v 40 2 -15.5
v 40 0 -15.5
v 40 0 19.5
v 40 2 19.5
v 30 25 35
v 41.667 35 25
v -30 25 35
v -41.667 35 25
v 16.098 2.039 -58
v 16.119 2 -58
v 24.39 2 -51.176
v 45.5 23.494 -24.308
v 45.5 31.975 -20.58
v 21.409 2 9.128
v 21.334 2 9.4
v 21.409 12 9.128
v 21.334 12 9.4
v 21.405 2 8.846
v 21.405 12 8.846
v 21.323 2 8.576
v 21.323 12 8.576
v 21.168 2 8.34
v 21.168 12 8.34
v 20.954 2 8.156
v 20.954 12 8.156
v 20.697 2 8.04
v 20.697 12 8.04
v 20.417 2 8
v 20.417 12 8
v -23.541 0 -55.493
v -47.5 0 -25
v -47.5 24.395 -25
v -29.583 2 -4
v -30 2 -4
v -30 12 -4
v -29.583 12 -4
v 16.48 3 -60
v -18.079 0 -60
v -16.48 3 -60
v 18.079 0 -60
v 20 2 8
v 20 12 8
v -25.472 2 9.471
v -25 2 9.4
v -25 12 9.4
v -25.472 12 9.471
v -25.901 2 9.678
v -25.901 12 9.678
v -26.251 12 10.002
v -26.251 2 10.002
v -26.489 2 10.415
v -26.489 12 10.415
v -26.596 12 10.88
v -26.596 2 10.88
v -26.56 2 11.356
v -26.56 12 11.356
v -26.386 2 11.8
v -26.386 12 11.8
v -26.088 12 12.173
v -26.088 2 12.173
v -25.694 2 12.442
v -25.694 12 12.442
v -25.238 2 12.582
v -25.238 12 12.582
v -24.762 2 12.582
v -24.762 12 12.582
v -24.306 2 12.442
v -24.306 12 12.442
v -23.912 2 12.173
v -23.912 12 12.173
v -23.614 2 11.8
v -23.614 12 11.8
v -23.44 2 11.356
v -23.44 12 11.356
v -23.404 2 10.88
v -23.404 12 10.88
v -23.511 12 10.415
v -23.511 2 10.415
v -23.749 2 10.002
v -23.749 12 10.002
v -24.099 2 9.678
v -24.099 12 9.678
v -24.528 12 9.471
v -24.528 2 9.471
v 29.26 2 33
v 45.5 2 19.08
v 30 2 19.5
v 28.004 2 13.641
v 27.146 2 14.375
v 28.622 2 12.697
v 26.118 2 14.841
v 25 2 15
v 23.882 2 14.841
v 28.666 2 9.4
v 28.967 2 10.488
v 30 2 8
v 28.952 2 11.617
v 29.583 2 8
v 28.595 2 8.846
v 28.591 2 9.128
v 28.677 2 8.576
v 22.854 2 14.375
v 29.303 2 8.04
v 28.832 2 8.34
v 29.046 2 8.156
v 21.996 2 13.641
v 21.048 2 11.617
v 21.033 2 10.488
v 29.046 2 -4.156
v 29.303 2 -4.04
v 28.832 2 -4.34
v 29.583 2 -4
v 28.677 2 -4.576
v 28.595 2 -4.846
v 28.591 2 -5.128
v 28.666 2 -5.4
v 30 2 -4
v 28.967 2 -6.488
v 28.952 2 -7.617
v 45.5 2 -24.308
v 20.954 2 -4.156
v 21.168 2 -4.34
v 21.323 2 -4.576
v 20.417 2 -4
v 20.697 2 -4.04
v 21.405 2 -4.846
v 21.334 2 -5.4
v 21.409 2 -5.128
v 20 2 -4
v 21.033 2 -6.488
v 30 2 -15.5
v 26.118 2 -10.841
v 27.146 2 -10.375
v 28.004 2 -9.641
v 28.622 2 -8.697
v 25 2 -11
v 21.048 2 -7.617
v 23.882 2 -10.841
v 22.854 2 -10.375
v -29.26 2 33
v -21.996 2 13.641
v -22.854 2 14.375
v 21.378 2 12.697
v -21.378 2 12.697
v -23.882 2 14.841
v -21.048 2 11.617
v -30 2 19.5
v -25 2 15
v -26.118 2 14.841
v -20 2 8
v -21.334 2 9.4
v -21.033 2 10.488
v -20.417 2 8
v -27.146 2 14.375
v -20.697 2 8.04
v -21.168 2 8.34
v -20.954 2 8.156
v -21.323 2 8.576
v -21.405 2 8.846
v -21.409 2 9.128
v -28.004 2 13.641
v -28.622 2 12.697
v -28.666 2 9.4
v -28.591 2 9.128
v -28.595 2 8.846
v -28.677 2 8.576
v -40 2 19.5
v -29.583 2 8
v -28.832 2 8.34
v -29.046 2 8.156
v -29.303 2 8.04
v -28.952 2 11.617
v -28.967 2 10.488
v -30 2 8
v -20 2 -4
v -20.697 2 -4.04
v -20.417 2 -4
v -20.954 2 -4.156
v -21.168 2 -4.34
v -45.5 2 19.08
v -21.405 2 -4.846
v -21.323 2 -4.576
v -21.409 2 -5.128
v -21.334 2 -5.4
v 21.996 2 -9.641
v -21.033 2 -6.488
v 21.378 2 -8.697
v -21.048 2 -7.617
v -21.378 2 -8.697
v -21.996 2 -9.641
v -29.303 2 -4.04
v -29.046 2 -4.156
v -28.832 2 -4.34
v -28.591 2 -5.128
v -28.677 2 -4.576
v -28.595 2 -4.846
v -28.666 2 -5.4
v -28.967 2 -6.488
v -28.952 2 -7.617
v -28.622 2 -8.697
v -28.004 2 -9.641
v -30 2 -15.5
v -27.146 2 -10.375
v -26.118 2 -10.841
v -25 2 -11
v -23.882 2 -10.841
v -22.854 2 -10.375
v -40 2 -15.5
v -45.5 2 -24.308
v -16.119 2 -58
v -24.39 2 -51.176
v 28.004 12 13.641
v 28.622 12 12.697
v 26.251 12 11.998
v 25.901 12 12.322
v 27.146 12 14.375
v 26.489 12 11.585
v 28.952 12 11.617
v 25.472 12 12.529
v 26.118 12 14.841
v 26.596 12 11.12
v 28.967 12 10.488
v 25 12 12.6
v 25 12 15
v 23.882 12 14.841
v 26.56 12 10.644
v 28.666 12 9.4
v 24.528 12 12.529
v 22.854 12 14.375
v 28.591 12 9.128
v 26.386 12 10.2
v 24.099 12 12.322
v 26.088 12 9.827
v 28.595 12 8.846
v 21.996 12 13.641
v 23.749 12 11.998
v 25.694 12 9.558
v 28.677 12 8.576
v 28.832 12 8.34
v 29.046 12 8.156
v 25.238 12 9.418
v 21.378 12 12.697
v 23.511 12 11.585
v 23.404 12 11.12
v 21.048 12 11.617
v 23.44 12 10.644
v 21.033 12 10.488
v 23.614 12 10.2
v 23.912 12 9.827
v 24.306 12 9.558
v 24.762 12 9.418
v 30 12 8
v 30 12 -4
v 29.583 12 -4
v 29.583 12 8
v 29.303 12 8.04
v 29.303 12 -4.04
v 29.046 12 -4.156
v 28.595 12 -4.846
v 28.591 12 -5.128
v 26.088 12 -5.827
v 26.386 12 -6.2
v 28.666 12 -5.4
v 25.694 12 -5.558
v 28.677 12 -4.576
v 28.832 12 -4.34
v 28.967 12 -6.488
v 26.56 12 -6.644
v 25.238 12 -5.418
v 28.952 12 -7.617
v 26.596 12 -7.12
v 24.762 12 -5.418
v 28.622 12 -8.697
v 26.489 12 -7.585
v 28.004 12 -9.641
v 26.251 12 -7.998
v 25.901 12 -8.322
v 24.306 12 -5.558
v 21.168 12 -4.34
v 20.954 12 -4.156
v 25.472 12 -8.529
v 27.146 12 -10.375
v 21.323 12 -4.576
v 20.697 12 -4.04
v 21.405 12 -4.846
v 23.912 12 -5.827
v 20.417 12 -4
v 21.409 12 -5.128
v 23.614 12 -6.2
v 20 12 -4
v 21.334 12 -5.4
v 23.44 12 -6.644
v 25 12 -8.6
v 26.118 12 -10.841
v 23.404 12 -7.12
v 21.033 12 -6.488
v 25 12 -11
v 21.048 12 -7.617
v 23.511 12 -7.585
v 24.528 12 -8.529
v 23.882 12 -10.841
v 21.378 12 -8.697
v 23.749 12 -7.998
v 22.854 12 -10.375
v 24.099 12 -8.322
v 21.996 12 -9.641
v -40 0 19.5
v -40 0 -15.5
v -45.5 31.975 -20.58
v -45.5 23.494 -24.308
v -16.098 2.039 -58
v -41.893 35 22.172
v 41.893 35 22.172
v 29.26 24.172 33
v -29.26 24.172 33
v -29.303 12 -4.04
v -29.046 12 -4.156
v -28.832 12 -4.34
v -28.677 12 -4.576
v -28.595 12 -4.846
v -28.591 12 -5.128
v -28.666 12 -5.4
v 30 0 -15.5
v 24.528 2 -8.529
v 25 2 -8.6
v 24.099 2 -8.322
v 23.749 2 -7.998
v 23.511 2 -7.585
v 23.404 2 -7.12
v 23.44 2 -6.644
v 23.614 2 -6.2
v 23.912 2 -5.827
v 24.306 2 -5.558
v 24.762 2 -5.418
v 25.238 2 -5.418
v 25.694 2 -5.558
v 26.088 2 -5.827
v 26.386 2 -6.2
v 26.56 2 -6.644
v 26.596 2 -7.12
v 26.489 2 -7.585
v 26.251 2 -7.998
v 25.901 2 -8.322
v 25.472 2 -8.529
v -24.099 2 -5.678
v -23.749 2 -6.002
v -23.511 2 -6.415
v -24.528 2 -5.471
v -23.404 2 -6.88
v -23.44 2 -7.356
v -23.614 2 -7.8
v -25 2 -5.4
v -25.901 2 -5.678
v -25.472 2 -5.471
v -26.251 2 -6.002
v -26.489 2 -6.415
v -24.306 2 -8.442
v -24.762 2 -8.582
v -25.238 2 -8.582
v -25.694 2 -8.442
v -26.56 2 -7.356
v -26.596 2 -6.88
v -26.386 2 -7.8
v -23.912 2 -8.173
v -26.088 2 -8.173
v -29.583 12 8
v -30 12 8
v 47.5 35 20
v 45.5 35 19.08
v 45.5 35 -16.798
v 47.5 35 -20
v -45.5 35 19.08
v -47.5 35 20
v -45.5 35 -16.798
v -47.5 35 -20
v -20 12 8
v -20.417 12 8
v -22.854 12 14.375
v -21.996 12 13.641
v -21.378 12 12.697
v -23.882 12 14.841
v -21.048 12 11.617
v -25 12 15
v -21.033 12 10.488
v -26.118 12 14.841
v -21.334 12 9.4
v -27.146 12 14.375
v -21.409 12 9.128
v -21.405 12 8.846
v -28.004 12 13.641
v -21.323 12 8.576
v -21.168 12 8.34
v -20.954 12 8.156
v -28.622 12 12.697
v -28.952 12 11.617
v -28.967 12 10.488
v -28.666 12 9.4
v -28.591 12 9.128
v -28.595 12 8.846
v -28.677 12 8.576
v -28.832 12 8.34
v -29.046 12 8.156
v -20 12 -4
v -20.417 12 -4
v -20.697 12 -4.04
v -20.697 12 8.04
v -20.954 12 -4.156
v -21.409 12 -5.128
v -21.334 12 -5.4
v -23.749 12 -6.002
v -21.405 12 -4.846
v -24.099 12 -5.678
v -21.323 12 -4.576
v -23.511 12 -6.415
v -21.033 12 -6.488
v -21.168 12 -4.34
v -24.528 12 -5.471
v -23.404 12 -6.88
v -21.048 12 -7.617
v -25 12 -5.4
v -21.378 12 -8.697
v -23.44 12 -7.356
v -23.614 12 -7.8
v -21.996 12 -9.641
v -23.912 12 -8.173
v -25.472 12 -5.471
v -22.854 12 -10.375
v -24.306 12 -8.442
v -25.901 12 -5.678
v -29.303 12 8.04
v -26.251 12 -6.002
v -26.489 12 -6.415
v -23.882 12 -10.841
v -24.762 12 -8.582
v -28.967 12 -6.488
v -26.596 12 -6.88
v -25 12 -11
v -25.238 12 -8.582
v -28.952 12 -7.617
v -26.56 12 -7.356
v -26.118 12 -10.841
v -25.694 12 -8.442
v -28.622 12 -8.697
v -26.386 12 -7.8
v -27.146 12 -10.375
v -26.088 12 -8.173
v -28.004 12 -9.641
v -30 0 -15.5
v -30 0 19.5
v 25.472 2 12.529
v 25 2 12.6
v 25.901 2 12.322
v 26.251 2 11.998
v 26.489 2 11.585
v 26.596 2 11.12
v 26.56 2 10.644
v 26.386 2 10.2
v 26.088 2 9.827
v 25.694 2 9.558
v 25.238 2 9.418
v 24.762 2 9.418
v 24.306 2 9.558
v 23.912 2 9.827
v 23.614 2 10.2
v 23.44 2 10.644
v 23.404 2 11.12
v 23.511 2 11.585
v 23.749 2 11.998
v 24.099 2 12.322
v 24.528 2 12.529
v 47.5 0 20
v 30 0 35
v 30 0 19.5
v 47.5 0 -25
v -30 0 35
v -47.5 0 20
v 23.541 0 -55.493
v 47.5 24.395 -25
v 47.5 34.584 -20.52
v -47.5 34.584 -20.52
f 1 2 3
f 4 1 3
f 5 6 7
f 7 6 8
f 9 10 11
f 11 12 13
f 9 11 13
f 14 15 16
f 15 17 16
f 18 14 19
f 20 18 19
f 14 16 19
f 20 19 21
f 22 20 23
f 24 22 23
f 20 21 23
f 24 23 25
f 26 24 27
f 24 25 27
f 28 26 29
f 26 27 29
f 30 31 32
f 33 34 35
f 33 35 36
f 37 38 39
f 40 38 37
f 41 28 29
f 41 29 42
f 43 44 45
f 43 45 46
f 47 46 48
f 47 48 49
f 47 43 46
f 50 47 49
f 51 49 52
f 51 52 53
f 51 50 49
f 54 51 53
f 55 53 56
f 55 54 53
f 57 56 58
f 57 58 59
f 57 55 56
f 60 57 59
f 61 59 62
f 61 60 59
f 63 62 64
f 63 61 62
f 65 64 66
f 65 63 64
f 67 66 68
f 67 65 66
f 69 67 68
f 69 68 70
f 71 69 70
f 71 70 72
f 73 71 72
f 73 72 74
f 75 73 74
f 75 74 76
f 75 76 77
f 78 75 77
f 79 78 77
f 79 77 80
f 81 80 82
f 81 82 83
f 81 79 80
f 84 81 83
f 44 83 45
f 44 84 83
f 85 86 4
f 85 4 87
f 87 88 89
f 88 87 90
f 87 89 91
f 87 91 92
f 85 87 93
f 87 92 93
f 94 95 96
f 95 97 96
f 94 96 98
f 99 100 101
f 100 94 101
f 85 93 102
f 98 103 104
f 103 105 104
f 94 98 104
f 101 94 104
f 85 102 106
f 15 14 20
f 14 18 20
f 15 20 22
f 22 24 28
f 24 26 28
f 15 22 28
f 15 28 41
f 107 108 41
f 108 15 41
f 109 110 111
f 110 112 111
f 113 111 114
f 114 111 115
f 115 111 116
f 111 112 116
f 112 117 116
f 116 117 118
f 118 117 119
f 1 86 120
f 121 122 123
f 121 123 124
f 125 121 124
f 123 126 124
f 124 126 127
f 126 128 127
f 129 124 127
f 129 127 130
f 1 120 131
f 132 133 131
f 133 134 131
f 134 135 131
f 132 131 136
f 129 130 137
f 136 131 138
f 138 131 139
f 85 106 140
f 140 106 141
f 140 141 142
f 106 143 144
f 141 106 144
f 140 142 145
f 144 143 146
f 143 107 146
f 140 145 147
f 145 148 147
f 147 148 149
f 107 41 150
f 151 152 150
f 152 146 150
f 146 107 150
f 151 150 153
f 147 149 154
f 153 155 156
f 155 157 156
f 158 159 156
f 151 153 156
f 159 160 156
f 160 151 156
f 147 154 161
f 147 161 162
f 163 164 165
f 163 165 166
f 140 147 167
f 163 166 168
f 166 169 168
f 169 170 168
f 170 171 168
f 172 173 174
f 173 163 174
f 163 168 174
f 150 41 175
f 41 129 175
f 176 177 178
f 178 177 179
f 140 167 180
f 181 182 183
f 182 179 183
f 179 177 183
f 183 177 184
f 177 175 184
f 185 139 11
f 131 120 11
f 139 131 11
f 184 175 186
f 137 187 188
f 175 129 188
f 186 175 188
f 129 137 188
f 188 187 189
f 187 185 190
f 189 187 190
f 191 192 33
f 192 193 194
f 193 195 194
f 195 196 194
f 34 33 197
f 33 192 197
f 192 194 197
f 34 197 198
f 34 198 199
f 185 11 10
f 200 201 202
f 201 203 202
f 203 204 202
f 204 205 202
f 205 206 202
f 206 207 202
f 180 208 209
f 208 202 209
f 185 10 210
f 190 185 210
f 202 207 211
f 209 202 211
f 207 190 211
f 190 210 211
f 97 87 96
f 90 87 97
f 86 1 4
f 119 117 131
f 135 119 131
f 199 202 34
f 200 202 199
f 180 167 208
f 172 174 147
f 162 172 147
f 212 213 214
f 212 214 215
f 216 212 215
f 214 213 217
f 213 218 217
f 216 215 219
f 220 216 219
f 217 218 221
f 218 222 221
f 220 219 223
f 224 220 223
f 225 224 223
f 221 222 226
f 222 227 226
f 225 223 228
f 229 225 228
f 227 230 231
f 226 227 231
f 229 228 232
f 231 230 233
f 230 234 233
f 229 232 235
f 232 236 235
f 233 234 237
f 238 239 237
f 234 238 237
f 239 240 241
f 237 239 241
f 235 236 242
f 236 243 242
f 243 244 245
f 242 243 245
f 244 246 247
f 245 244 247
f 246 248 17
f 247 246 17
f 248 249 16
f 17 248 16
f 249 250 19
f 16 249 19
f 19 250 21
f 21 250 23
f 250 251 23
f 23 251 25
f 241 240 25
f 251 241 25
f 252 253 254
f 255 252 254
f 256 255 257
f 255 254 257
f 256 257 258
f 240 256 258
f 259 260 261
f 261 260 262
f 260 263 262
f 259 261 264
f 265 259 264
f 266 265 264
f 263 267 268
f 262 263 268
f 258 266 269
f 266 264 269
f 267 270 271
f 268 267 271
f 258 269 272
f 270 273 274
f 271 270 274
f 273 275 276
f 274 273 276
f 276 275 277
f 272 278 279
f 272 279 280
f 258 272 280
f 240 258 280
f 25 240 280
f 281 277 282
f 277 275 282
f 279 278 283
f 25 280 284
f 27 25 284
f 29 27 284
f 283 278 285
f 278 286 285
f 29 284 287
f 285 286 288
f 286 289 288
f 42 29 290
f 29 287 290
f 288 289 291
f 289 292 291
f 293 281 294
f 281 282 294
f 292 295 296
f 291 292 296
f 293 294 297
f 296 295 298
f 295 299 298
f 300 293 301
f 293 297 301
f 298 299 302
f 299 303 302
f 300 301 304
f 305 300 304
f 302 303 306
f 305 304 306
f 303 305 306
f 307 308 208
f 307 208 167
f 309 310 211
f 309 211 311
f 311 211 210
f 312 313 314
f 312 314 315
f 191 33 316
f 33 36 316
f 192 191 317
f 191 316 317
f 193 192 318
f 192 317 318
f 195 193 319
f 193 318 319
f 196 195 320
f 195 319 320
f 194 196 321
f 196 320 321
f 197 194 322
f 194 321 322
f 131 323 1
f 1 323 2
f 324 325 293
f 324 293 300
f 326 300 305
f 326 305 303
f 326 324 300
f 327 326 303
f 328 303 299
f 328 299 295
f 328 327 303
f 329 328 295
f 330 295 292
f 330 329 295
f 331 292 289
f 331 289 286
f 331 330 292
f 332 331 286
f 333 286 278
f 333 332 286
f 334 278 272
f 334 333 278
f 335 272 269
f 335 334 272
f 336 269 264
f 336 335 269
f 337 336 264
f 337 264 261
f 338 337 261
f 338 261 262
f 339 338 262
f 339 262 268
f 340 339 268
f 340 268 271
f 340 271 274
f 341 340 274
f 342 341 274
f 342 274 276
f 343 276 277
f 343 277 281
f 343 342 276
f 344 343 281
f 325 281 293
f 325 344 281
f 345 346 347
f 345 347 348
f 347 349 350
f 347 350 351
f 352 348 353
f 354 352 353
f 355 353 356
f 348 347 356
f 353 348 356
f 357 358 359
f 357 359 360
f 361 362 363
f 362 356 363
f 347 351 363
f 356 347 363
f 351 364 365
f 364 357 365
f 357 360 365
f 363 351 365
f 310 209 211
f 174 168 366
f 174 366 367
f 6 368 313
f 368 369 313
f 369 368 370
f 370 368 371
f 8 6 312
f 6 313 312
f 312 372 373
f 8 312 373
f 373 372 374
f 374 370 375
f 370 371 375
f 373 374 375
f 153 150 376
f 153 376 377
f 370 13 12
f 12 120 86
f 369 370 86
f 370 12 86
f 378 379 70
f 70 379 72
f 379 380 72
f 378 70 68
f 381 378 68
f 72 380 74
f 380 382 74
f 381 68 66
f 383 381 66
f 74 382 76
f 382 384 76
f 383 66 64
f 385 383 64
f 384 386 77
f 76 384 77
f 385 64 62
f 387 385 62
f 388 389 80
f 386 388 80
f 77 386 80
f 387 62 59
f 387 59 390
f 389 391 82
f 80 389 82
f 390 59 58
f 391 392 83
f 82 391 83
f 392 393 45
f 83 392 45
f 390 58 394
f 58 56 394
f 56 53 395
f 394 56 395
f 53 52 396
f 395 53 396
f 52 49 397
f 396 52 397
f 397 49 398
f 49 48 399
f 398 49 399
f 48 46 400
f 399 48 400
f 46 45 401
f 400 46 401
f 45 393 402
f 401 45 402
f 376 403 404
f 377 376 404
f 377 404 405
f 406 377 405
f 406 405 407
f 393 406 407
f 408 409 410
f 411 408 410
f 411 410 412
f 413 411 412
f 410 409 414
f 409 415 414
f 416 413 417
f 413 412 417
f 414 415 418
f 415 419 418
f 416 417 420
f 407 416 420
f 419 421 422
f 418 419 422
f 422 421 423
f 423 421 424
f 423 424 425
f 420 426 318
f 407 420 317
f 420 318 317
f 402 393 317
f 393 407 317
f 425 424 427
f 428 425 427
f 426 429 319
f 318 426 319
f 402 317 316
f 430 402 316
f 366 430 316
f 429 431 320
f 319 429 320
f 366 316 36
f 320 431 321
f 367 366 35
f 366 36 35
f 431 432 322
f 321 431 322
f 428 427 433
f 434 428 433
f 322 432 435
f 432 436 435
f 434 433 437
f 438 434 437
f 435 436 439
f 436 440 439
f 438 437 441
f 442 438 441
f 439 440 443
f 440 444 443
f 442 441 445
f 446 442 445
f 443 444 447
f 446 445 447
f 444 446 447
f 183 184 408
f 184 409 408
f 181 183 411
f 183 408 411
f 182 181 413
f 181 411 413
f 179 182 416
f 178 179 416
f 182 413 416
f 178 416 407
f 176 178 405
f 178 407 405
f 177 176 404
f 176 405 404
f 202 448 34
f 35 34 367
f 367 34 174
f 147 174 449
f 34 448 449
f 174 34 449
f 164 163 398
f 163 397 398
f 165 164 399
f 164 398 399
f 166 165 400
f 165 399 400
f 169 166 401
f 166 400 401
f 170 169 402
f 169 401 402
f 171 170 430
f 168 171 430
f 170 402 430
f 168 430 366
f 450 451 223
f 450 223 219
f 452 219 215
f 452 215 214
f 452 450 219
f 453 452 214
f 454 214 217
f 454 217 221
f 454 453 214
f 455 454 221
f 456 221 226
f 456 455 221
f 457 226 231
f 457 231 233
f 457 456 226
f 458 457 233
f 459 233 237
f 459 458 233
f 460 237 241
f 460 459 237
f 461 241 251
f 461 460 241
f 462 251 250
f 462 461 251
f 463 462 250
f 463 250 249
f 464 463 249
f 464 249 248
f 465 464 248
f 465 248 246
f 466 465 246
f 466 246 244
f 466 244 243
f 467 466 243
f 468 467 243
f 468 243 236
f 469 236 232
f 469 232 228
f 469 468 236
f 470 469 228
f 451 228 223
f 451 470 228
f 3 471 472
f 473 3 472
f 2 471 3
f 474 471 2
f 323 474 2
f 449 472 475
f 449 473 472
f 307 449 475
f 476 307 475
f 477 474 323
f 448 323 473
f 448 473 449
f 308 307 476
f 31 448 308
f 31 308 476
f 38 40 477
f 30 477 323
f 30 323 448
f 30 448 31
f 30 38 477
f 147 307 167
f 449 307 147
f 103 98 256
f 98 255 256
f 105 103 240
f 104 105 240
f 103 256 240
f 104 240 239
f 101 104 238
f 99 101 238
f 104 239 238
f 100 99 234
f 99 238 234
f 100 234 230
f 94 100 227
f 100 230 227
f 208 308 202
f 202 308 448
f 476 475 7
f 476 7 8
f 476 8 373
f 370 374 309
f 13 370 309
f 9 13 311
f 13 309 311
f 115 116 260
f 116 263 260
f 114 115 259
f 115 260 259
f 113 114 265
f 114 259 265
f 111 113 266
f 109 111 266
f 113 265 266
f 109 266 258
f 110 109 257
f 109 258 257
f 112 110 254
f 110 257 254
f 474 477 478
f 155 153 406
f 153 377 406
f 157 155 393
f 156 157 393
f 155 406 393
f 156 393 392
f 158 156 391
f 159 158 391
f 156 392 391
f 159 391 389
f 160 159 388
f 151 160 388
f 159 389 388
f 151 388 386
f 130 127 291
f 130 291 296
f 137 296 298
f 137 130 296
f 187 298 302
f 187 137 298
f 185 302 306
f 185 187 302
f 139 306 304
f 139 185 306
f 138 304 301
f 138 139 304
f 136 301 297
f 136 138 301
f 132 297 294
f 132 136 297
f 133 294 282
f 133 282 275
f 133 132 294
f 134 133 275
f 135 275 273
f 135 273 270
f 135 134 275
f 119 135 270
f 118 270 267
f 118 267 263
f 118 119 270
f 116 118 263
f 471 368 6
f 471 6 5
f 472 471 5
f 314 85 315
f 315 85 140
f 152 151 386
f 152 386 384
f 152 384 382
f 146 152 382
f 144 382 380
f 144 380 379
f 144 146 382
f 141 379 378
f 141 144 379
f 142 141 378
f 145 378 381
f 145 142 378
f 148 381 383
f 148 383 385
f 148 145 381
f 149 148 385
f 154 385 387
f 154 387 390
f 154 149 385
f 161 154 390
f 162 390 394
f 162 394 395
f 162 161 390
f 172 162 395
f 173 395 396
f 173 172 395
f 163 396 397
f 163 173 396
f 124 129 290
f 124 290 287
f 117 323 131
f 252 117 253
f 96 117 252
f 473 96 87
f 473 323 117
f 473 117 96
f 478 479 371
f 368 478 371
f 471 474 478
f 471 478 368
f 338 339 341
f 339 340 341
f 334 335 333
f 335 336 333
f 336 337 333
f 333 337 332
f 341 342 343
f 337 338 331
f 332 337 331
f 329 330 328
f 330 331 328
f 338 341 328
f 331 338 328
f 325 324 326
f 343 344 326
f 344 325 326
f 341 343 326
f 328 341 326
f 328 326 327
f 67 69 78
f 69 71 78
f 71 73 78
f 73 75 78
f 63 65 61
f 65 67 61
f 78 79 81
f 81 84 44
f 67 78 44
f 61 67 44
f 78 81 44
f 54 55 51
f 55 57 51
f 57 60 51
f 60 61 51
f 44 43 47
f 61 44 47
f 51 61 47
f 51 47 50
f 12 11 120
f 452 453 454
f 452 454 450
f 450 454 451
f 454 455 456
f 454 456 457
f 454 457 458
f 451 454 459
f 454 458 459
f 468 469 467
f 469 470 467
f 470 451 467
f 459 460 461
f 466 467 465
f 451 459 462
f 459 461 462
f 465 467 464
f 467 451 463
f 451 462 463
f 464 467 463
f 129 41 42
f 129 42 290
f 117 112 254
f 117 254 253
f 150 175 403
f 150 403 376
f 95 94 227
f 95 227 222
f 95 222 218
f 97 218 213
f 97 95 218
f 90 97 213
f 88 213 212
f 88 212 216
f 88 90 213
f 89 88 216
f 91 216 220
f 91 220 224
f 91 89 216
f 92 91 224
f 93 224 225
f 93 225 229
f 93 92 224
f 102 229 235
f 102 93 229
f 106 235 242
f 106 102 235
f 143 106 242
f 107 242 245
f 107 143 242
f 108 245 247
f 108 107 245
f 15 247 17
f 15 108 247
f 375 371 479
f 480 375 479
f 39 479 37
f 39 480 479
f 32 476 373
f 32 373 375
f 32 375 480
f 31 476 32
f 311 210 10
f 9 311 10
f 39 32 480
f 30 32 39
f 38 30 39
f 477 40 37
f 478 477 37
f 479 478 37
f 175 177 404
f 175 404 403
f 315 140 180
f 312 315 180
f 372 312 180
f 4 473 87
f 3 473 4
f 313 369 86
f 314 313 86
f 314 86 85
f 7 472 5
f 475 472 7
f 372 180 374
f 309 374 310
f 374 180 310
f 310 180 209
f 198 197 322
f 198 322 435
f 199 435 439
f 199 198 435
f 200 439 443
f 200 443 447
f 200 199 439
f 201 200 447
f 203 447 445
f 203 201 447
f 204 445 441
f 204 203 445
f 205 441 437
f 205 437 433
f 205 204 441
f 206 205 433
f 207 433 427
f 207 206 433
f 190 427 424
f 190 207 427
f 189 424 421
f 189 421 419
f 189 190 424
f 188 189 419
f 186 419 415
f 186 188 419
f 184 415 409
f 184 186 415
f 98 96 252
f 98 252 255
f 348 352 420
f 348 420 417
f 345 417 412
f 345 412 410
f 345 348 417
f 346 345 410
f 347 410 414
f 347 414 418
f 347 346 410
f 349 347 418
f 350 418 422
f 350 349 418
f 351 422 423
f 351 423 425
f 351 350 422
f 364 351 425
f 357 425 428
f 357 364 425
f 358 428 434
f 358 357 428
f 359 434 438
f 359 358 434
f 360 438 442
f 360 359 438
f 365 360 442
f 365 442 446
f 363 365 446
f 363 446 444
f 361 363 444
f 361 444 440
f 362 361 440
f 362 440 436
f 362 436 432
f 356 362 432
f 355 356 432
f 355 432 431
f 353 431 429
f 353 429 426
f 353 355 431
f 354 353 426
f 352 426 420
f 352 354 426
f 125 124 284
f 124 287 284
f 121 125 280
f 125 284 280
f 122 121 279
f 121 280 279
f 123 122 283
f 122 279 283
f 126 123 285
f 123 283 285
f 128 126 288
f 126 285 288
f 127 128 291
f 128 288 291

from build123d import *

# Parameters (mm, degrees)
AUFSATZ_LINEAR_AUSTRAGEN1_DEPTH      = 35
SCHNITT_LINEAR_AUSTRAGEN1_DEPTH      = 85.150163399
SCHNITT_LINEAR_AUSTRAGEN1_DEPTH_BACK = 85.150163399
FASE6_SIZE                           = 3
FASE6_SIZE2                          = 5.591073264
FASE6_EDGE_2_SIZE                    = 3
FASE6_EDGE_2_SIZE2                   = 5.591073264
FASE7_SIZE                           = 10
WANDUNG3_T                           = -2
SCHNITT_LINEAR_AUSTRAGEN2_REACH      = 86.15
SKIZZE9_W                            = 10
SKIZZE9_H                            = 35
SKIZZE10_R                           = 1.6
AUFSATZ_LINEAR_AUSTRAGEN3_DEPTH      = 10
VERRUNDUNG4_R                        = 1


with BuildPart() as part:
    # Skizze6 → Aufsatz-Linear austragen1 (new body)
    with BuildSketch(Plane(origin=(0, 0, 0), x_dir=(1, 0, 0), z_dir=(0, 1, 0))):
        Polygon((30, -35), (-30, -35), (-47.5, -20), (-47.5, 25), (-20, 60), (20, 60), (47.5, 25), (47.5, -20), align=None)
    extrude(amount=AUFSATZ_LINEAR_AUSTRAGEN1_DEPTH)

    # Skizze8 → Schnitt-Linear austragen1 (cut, two sides: drawn at the far end of the back side and taken through both)
    with BuildSketch(Plane(origin=(0, 0, 0), x_dir=(0, 0, -1), z_dir=(1, 0, 0)).offset(-SCHNITT_LINEAR_AUSTRAGEN1_DEPTH_BACK)):
        Polygon((20, 35), (60, 3), (60, 35), align=None)
    extrude(amount=SCHNITT_LINEAR_AUSTRAGEN1_DEPTH + SCHNITT_LINEAR_AUSTRAGEN1_DEPTH_BACK, mode=Mode.SUBTRACT)

    # Fase6
    fase6_edges = [part.edges().sort_by_distance(p)[0] for p in [
        (33.75, 17, -42.5),
    ]]
    fase6_side = [part.faces().sort_by_distance(p)[0] for p in [
        (0, 21.261380323, -37.173274596),
    ]]
    chamfer(fase6_edges, length=FASE6_SIZE, length2=FASE6_SIZE2, reference=fase6_side[0])

    # Fase6 edge 2
    fase6_edge_2_edges = [part.edges().sort_by_distance(p)[0] for p in [
        (-33.75, 17, -42.5),
    ]]
    fase6_edge_2_side = [part.faces().sort_by_distance(p)[0] for p in [
        (0, 21.261380323, -37.173274596),
    ]]
    chamfer(fase6_edge_2_edges, length=FASE6_EDGE_2_SIZE, length2=FASE6_EDGE_2_SIZE2, reference=fase6_edge_2_side[0])

    # Fase7
    fase7_edges = [part.edges().sort_by_distance(p)[0] for p in [
        (0, 35, 35),
    ]]
    chamfer(fase7_edges, length=FASE7_SIZE)

    # Wandung3
    wandung3_openings = [part.faces().sort_by_distance(p)[0] for p in [
        (0, 35, 2.356885836),
    ]]
    offset(amount=WANDUNG3_T, openings=wandung3_openings, kind=Kind.INTERSECTION)

    # Skizze9 → Schnitt-Linear austragen2 (cut, up to next)
    with BuildSketch(Plane.XZ, mode=Mode.PRIVATE) as schnitt_linear_austragen2_sk1:
        with Locations((-35, 2)):
            Rectangle(SKIZZE9_W, SKIZZE9_H)
    schnitt_linear_austragen2_tool1 = extrude(schnitt_linear_austragen2_sk1.sketch, amount=-SCHNITT_LINEAR_AUSTRAGEN2_REACH, mode=Mode.PRIVATE) & part.part
    # Skizze9 → Schnitt-Linear austragen2 (cut, up to next)
    with BuildSketch(Plane.XZ, mode=Mode.PRIVATE) as schnitt_linear_austragen2_sk2:
        with Locations((35, 2)):
            Rectangle(SKIZZE9_W, SKIZZE9_H)
    schnitt_linear_austragen2_tool2 = extrude(schnitt_linear_austragen2_sk2.sketch, amount=-SCHNITT_LINEAR_AUSTRAGEN2_REACH, mode=Mode.PRIVATE) & part.part
    add(schnitt_linear_austragen2_tool1.solids().sort_by_distance((-35, 0, 2))[0], mode=Mode.SUBTRACT)
    add(schnitt_linear_austragen2_tool2.solids().sort_by_distance((35, 0, 2))[0], mode=Mode.SUBTRACT)

    # Skizze10 → Aufsatz-Linear austragen3 (add)
    # profile 1 of 2: a face of its own
    with BuildSketch(Plane(origin=(0, 2, 0), x_dir=(1, 0, 0), z_dir=(0, 1, 0))):
        with BuildLine():
            Line((-30, 4), (-27.645751311, 4))
            ThreePointArc((-27.645751311, 4), (-25, 11), (-22.354248689, 4))
            Line((-22.354248689, 4), (-20, 4))
            Line((-20, 4), (-20, -8))
            Line((-20, -8), (-22.354248689, -8))
            ThreePointArc((-22.354248689, -8), (-25, -15), (-27.645751311, -8))
            Line((-27.645751311, -8), (-30, -8))
            Line((-30, -8), (-30, 4))
        make_face()
        with Locations(Location((-25, 7, 0), (0, 0, 270))):
            Circle(SKIZZE10_R, mode=Mode.SUBTRACT)
        with Locations(Location((-25, -11, 0), (0, 0, 90))):
            Circle(SKIZZE10_R, mode=Mode.SUBTRACT)
    # profile 2 of 2: a face of its own
    with BuildSketch(Plane(origin=(0, 2, 0), x_dir=(1, 0, 0), z_dir=(0, 1, 0))):
        with BuildLine():
            Line((22.354248689, -8), (20, -8))
            Line((20, -8), (20, 4))
            Line((20, 4), (22.354248689, 4))
            ThreePointArc((22.354248689, 4), (25, 11), (27.645751311, 4))
            Line((27.645751311, 4), (30, 4))
            Line((30, 4), (30, -8))
            Line((30, -8), (27.645751311, -8))
            ThreePointArc((27.645751311, -8), (25, -15), (22.354248689, -8))
        make_face()
        with Locations(Location((25, -11, 0), (0, 0, 270))):
            Circle(SKIZZE10_R, mode=Mode.SUBTRACT)
        with Locations(Location((25, 7, 0), (0, 0, 90))):
            Circle(SKIZZE10_R, mode=Mode.SUBTRACT)
    extrude(amount=AUFSATZ_LINEAR_AUSTRAGEN3_DEPTH)

    # Verrundung4
    verrundung4_edges = [part.edges().sort_by_distance(p)[0] for p in [
        (-22.354248689, 7, 8),
        (-22.354248689, 7, -4),
        (-27.645751311, 7, -4),
        (-27.645751311, 7, 8),
        (27.645751311, 7, -4),
        (22.354248689, 7, -4),
        (22.354248689, 7, 8),
        (27.645751311, 7, 8),
    ]]
    fillet(verrundung4_edges, radius=VERRUNDUNG4_R)


solid = part.part
